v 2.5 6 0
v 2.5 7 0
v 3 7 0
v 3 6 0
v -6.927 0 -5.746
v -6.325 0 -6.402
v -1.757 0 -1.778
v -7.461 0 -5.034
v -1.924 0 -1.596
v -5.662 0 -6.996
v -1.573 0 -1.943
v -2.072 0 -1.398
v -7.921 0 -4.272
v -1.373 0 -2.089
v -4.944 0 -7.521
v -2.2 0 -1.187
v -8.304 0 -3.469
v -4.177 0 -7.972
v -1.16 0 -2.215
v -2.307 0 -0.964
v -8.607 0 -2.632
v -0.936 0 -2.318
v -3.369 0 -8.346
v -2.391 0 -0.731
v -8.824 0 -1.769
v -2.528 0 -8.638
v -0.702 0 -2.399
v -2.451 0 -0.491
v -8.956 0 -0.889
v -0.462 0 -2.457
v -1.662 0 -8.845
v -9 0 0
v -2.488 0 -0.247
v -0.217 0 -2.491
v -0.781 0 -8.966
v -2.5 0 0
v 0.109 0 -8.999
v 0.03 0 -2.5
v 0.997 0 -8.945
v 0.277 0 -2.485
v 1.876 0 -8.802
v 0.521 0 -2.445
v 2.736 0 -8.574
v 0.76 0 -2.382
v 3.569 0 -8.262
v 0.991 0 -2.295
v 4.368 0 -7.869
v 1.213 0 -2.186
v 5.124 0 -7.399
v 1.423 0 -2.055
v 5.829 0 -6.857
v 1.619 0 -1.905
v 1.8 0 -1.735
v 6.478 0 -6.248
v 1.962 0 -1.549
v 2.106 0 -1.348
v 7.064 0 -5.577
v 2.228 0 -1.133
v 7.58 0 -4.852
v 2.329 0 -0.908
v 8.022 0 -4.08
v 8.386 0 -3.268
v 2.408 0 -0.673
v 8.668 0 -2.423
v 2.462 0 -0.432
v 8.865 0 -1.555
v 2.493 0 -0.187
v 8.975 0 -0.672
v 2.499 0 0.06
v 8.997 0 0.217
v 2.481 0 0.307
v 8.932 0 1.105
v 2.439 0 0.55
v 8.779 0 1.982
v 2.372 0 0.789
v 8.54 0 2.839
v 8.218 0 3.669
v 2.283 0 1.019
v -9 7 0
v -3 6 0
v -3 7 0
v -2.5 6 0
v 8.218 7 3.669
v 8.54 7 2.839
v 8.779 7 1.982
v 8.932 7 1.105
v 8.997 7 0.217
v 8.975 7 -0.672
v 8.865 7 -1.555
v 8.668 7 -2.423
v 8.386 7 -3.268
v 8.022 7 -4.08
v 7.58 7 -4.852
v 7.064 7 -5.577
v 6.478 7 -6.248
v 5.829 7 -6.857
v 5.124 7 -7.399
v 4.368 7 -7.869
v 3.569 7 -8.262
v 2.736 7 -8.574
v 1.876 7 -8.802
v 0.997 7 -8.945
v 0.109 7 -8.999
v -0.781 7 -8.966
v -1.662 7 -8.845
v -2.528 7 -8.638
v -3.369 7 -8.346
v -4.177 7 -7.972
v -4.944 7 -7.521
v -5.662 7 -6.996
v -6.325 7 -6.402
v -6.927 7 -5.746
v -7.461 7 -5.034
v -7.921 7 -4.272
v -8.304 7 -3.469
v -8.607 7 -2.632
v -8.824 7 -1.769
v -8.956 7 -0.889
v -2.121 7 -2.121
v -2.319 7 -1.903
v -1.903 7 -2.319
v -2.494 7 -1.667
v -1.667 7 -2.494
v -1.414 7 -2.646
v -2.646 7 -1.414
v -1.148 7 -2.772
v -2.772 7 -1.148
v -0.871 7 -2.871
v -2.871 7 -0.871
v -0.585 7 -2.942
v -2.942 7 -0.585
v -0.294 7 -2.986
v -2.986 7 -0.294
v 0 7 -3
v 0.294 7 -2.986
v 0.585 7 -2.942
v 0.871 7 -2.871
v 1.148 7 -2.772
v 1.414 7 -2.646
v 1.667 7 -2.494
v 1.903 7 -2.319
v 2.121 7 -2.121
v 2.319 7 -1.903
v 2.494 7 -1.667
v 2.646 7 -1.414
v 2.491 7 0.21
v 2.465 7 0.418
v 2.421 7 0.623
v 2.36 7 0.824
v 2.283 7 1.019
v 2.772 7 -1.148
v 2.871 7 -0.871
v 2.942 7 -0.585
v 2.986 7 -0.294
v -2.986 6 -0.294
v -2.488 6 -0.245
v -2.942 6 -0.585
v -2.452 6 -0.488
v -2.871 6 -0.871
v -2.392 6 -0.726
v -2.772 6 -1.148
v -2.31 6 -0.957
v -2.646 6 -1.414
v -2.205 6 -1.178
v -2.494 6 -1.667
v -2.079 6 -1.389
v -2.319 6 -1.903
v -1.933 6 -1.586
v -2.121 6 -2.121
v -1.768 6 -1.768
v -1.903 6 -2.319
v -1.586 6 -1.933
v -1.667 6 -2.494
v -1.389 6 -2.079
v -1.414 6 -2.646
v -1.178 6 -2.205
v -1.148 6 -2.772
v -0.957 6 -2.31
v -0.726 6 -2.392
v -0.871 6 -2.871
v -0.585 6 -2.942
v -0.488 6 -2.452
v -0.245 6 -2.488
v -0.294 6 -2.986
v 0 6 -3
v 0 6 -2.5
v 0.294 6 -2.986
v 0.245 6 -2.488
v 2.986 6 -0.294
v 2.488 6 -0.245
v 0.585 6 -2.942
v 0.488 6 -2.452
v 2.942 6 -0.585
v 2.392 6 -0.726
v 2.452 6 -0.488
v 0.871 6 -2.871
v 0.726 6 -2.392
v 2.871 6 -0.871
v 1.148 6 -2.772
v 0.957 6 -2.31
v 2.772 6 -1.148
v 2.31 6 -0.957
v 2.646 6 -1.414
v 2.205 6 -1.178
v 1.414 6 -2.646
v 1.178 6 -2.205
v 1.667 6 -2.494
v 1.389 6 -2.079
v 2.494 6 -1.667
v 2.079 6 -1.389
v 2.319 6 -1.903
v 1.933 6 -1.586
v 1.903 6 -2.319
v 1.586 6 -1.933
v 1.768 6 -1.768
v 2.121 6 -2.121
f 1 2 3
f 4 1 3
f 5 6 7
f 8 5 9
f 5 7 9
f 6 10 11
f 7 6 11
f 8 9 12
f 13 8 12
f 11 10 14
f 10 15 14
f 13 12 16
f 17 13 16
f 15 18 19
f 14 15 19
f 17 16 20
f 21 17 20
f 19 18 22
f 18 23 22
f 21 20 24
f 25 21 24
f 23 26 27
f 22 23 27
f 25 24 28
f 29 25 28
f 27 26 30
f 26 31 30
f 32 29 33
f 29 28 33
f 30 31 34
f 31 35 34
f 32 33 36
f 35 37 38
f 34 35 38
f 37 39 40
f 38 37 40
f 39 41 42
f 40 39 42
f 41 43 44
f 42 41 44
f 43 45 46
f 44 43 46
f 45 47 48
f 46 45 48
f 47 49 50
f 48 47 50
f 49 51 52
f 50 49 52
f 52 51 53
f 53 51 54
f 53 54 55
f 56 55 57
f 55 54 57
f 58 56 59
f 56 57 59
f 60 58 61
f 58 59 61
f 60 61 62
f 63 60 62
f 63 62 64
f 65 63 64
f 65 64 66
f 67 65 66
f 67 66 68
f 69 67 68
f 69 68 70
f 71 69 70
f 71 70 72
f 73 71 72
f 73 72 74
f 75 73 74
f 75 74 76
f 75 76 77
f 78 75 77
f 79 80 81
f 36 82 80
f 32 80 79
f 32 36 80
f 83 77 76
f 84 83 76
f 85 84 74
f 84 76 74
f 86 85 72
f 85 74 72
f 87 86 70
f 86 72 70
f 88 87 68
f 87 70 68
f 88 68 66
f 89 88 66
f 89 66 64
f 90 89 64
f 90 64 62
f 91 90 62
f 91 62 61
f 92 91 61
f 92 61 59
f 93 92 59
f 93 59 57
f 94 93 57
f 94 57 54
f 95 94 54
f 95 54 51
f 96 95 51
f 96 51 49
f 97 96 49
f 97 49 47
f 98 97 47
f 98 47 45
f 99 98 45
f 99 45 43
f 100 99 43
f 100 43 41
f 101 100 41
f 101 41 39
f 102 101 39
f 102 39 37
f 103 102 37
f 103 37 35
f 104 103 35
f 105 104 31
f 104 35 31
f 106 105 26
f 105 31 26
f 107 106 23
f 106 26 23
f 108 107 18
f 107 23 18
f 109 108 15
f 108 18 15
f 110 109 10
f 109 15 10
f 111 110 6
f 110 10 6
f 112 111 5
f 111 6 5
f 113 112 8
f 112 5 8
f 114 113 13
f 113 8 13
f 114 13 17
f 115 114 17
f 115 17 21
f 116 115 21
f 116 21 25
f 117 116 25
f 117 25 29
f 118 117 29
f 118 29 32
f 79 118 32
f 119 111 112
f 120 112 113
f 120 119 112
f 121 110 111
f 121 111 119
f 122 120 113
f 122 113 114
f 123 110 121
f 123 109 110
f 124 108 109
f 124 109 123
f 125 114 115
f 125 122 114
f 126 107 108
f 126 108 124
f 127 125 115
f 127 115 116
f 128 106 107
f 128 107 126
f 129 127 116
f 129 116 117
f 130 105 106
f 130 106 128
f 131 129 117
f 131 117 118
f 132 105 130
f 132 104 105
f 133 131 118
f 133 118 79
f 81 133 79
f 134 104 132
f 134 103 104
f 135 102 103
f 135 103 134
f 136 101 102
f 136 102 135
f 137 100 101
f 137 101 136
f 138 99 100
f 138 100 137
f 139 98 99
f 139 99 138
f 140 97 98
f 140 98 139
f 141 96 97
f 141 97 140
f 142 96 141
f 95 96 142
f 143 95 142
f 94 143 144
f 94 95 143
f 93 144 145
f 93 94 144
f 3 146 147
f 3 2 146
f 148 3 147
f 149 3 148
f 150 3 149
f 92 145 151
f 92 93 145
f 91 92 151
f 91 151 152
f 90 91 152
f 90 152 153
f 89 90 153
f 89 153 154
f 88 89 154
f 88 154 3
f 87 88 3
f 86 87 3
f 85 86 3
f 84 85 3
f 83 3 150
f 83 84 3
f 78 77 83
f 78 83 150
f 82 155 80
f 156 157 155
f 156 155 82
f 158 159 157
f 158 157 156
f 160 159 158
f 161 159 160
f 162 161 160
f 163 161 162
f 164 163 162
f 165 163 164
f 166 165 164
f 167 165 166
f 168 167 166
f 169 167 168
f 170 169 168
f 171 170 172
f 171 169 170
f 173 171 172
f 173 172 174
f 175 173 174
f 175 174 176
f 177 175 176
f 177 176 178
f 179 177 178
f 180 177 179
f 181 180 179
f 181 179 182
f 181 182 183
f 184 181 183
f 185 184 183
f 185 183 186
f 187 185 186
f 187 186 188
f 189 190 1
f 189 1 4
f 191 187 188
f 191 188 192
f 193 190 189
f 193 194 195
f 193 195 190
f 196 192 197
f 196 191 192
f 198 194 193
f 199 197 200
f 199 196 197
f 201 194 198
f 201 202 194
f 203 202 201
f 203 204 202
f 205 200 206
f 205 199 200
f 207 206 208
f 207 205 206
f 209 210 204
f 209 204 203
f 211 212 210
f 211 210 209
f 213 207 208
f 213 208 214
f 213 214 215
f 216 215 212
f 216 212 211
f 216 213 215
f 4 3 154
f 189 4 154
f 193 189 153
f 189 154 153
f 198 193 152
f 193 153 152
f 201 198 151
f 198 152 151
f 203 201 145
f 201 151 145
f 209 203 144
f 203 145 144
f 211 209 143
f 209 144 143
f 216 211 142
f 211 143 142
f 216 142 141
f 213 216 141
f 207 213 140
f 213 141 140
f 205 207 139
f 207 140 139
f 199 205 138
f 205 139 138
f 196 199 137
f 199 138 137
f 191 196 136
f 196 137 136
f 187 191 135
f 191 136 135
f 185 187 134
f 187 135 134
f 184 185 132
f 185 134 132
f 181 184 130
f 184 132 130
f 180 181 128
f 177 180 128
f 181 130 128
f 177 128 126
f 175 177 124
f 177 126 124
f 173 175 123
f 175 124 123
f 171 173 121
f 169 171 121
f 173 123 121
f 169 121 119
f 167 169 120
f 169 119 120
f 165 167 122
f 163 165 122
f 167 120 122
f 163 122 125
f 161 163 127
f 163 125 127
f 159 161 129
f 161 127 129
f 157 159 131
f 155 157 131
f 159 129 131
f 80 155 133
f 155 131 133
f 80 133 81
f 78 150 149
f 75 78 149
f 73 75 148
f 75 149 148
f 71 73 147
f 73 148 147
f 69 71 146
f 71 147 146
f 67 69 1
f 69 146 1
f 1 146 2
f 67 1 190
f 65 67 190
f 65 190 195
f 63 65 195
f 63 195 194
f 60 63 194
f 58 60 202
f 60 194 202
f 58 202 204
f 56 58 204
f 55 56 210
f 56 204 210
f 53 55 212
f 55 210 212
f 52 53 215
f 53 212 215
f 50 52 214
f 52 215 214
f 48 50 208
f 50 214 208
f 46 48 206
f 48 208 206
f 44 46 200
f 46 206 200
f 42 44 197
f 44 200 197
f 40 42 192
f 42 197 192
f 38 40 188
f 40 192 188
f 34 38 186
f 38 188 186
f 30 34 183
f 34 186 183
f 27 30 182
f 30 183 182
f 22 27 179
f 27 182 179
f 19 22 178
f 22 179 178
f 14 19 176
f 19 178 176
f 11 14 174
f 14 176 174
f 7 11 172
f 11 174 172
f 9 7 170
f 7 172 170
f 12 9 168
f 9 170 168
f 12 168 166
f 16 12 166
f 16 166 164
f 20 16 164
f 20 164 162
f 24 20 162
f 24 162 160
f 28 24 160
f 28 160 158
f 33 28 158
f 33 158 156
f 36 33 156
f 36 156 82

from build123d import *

# Parameters (mm, degrees)
SKETCH1_R           = 9
BOSS_EXTRUDE1_DEPTH = 7
SKETCH2_R           = 2.5
CUT_EXTRUDE4_DEPTH  = 11
CUT_EXTRUDE5_START  = -14
CUT_EXTRUDE5_DEPTH  = 14
CUT_EXTRUDE6_DEPTH  = 1


with BuildPart() as part:
    # Sketch1 → Boss-Extrude1 (new body)
    with BuildSketch(Plane(origin=(0, 0, 0), x_dir=(1, 0, 0), z_dir=(0, 1, 0))):
        with Locations(Location((0, 0, 0), (0, 0, 270))):
            Circle(SKETCH1_R)
    extrude(amount=BOSS_EXTRUDE1_DEPTH)

    # Sketch2 → Cut-Extrude4 (cut)
    with BuildSketch(Plane(origin=(0, 7, 0), x_dir=(1, 0, 0), z_dir=(0, 1, 0))):
        with Locations(Location((0, 0, 0), (0, 0, 270))):
            Circle(SKETCH2_R)
    extrude(amount=-CUT_EXTRUDE4_DEPTH, mode=Mode.SUBTRACT)

    # Sketch16 → Cut-Extrude5 (cut)
    with BuildSketch(Plane(origin=(0, 7, 0), x_dir=(1, 0, 0), z_dir=(0, 1, 0)).offset(CUT_EXTRUDE5_START)):
        with BuildLine():
            Line((2.282849902, -1.019115461), (-2.5, 0))
            Line((-2.5, 0), (-9, 0))
            ThreePointArc((-9, 0), (-1.877482723, -8.801991742), (8.216679694, -3.672352761))
            ThreePointArc((8.216679694, -3.672352761), (8.217469862, -3.670584296), (8.218259648, -3.66881566))
            Line((8.218259648, -3.66881566), (2.282849902, -1.019115461))
        make_face()
    extrude(amount=CUT_EXTRUDE5_DEPTH, mode=Mode.SUBTRACT)

    # Sketch23 → Cut-Extrude6 (cut)
    with BuildSketch(Plane(origin=(0, 7, 0), x_dir=(1, 0, 0), z_dir=(0, 1, 0))):
        with BuildLine():
            ThreePointArc((3, 0), (0, 3), (-3, 0))
            Line((-3, 0), (-2.5, 0))
            ThreePointArc((-2.5, 0), (0, 2.5), (2.5, 0))
            Line((2.5, 0), (3, 0))
        make_face()
    extrude(amount=-CUT_EXTRUDE6_DEPTH, mode=Mode.SUBTRACT)


solid = part.part
